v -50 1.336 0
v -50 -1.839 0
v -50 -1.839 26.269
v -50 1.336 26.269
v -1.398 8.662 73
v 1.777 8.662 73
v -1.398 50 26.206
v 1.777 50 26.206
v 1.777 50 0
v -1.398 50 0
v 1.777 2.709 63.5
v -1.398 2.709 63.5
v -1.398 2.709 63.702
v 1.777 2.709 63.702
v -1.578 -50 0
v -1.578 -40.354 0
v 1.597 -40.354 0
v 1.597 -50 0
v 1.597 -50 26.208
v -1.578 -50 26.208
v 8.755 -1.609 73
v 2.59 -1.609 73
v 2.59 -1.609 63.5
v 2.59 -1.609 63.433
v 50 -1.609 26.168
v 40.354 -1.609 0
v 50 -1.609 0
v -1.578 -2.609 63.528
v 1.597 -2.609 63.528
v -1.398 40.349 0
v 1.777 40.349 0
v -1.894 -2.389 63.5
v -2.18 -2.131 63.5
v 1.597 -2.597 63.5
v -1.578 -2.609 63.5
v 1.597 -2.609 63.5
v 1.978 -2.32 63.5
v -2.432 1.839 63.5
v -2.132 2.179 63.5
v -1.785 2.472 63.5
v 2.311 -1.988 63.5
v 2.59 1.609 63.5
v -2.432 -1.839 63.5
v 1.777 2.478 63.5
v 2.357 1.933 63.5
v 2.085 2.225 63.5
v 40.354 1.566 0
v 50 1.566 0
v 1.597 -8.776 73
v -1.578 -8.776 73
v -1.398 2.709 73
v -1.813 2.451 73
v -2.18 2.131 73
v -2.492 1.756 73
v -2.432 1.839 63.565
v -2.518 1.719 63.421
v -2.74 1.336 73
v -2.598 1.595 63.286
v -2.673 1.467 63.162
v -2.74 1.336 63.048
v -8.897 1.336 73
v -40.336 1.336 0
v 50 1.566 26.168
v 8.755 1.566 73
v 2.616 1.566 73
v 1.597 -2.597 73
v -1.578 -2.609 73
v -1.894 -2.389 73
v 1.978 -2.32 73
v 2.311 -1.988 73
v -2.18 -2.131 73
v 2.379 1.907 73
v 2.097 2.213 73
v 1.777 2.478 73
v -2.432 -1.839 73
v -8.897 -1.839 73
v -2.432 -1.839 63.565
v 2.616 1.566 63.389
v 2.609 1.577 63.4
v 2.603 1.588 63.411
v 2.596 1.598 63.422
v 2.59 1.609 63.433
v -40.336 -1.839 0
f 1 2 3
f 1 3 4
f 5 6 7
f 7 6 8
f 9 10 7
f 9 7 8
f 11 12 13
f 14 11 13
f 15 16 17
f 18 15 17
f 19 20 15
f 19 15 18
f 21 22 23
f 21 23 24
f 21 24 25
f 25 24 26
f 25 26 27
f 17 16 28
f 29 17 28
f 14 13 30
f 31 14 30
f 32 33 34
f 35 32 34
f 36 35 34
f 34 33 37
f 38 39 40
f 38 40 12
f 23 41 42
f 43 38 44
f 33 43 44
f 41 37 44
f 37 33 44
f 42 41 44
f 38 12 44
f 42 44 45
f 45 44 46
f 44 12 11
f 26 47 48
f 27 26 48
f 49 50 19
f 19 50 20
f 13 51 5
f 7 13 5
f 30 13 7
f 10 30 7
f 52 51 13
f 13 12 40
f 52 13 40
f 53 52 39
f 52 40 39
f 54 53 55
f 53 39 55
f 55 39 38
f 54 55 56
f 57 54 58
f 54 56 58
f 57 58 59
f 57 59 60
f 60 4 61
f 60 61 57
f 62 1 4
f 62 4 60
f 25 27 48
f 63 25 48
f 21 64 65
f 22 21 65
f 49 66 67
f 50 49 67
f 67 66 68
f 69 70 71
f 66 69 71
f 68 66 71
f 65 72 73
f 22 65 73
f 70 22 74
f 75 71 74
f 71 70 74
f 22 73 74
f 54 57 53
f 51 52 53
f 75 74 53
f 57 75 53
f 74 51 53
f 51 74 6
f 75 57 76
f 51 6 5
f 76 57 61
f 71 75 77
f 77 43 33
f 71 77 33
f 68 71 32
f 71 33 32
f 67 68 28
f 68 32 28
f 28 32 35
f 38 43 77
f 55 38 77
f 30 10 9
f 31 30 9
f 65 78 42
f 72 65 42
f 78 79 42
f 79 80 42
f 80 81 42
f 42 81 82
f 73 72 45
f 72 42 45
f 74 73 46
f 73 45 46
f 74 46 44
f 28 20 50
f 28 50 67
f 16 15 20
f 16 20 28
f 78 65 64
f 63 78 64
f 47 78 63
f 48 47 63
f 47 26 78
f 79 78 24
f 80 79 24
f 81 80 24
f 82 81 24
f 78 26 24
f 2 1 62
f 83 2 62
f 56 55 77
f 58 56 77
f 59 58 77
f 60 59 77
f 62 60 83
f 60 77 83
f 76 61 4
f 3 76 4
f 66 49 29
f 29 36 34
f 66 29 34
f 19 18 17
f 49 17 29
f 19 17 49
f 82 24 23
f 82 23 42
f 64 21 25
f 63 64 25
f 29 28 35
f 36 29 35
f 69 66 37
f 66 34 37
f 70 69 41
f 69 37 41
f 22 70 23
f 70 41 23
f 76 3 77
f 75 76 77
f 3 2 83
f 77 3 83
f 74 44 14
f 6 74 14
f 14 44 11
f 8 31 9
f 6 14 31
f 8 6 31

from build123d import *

# Parameters (mm, degrees)
F0_R         = 3.0488268425
F1_DEPTH     = 110
F2_W         = 3.175
F2_H         = 50
F3_DEPTH     = 80
F5_DEPTH     = 3.175
F6_W         = 50
F6_H         = 3.175
F7_DEPTH     = 80
F9_DEPTH     = 3.2191170087
F10_W        = 3.175
F10_H        = 50
F11_DEPTH    = 80
F13_DEPTH    = 3.5540803911
F14_W        = 50
F14_H        = 3.175
F15_DEPTH    = 80
F17_DEPTH    = 3.175
F18_R        = 5.3096274698
F19_DEPTH    = 5
F21_S5_R     = 3.0488268425
F21_T6_DEPTH = 9
F22_R        = 9.4311090011
F23_DEPTH    = 42
F25_DEPTH    = 3.2191170087
F27_DEPTH    = 3.6788295158
F29_DEPTH    = 3.175
F31_DEPTH    = 3.175
F32_DEPTH    = 63.5


# Not quite as in the source:
# - a fillet or chamfer that OpenCascade refuses, or shapes differently, is made with other operations: its cross-section is extruded or revolved along the edge and cut away or added


with BuildPart() as f1:
    # F0 (on Top) → F1 (new body)
    with BuildSketch(Plane.XY):
        Circle(F0_R)
    extrude(amount=F1_DEPTH)

    # F2 (on Top) → F3 (join)
    with BuildSketch(Plane.XY):
        with Locations((0.0098423844, -25)):
            Rectangle(F2_W, F2_H)
    extrude(amount=F3_DEPTH)

    # F4 (on face) → F5 (cut, through all)
    with BuildSketch(Plane(origin=(-1.5776576156, 0, 0), x_dir=(0, -1, 0), z_dir=(-1, 0, 0))):
        Polygon((50, 80), (2.6088966181, 80), (50, 26.2083634734), align=None)
    extrude(amount=-F5_DEPTH, mode=Mode.SUBTRACT)

    # F6 (on Top) → F7 (join)
    with BuildSketch(Plane.XY):
        with Locations((25, -0.0215585044)):
            Rectangle(F6_W, F6_H)
    extrude(amount=F7_DEPTH)

    # F8 (on face) → F9 (cut, through all)
    with BuildSketch(Plane.XZ.offset(1.6090585044)):
        Polygon((50, 80), (2.5896478226, 80), (50, 26.1678732932), align=None)
    extrude(amount=-F9_DEPTH, mode=Mode.SUBTRACT)

    # F10 (on Top) → F11 (join)
    with BuildSketch(Plane.XY):
        with Locations((0.1890401955, 25)):
            Rectangle(F10_W, F10_H)
    extrude(amount=F11_DEPTH)

    # F12 (on face) → F13 (cut, through all)
    with BuildSketch(Plane.YZ.offset(1.7765401955)):
        Polygon((50, 80), (2.4777510064, 80), (50, 26.2062493712), align=None)
    extrude(amount=-F13_DEPTH, mode=Mode.SUBTRACT)

    # F14 (on Top) → F15 (join)
    with BuildSketch(Plane.XY):
        with Locations((-25, -0.2514147579)):
            Rectangle(F14_W, F14_H)
    extrude(amount=F15_DEPTH)

    # F16 (on face) → F17 (cut, through all)
    with BuildSketch(Plane(origin=(0, 1.3360852421, 0), x_dir=(-1, 0, 0), z_dir=(0, 1, 0))):
        Polygon((50, 80), (2.7404783053, 80), (50, 26.2688063085), align=None)
    extrude(amount=-F17_DEPTH, mode=Mode.SUBTRACT)

    # F18 (on face) → F19 (join)
    with BuildSketch(Plane.XY.offset(110)):
        Circle(F18_R)
    extrude(amount=F19_DEPTH)

    # F21: fillet of radius 5.08 on 1 edges, made by hand


with BuildPart() as f21_tool2:
    # F21_s3 → F21_t4 (revolve)
    with BuildSketch(Plane.XZ):
        with BuildLine():
            ThreePointArc((5.3096274698, 115.08), (3.8217299183, 111.4878975516), (0.2296274698, 110))
            Line((0.2296274698, 110), (5.3096274698, 110))
            Line((5.3096274698, 110), (5.3096274698, 115.08))
        make_face()
    revolve(axis=Axis((0, 0, 110), (0, 0, 1)))

    # F21_s5 → F21_t6 (cut, symmetric)
    with BuildSketch(Plane.XY.offset(112.5)):
        Circle(F21_S5_R)
    extrude(amount=F21_T6_DEPTH, both=True, mode=Mode.SUBTRACT)


with BuildPart() as f1_1:
    add(f1.part)

    # F21_t1: cut F21_tool2
    add(f21_tool2.part, mode=Mode.SUBTRACT)

    # F22 (on face) + F20 (on face) → F23 (cut)
    with BuildSketch(Plane.XY.offset(115)):
        Circle(F22_R)
        with BuildLine():
            add(Edge.make_bspline(
                [(5.3089975095, 0), (5.3089975164, -0.1612273834), (5.3031219673, -0.3224552101), (5.2913709183, -0.483414871), (5.2737606128, -0.6438392355), (5.250323482, -0.803462652), (5.1918928197, -1.1205792461), (5.1568991277, -1.2780732959), (5.1161757966, -1.4342389448), (5.0697872067, -1.5888164279), (5.0178133896, -1.7415503683), (4.9028866804, -2.0428291895), (4.8399334722, -2.1913748989), (4.7715861919, -2.3375759551), (4.6979552247, -2.4811885599), (4.6191655532, -2.621976066), (4.4515479732, -2.8974418959), (4.3627196038, -3.0321209774), (4.2690113246, -3.163516784), (4.1705758713, -3.2914095559), (4.0675790391, -3.4155892111), (3.8528203378, -3.6561214891), (3.741057878, -3.7724747735), (3.6250912427, -3.8847148691), (3.5051104607, -3.9926533309), (3.3813166507, -4.0961135978), (3.1836352831, -4.2494509759), (3.112252337, -4.3025577734), (3.0398087405, -4.3542238063), (2.9663409133, -4.4044227305), (2.8918861372, -4.4531294369), (2.6798136644, -4.5858529875), (2.5400273484, -4.6664055795), (2.3973513324, -4.7418353748), (2.2520206742, -4.812014427), (2.1042777659, -4.876829296), (1.7114232911, -5.0323715135), (1.4627882577, -5.1142142284), (1.2095369224, -5.1812867651), (0.9527644649, -5.2332758894), (0.6935915551, -5.2699775603), (0.2946385826, -5.302637144), (0.1557563369, -5.3096254474), (0.0166889737, -5.3122478349), (-0.1223921213, -5.3104992794), (-0.2613155342, -5.3043837311), (-0.6549222008, -5.27465023), (-0.9088254061, -5.240644445), (-1.1605447695, -5.1919788406), (-1.4090280657, -5.1288359037), (-1.6532455136, -5.0514985311), (-2.0428291895, -4.9028866804), (-2.1913748989, -4.8399334722), (-2.3375759551, -4.7715861919), (-2.4811885599, -4.6979552247), (-2.621976066, -4.6191655532), (-2.9069406851, -4.4457680805), (-3.0506829028, -4.3504435211), (-3.1906552392, -4.2495537919), (-3.326590046, -4.1432865783), (-3.4582324188, -4.0318465385), (-3.7042475112, -3.8065731668), (-3.8191871972, -3.6933574313), (-3.9299611895, -3.5759895387), (-4.0363834457, -3.4546618709), (-4.1382799458, -3.3295777493), (-4.3025292517, -3.1122435833), (-4.3673403783, -3.0218507611), (-4.4298690538, -2.9298431328), (-4.4900653265, -2.8362928914), (-4.547882312, -2.7412742583), (-4.7085243801, -2.4616834099), (-4.8050260286, -2.2734759427), (-4.8924795443, -2.0807665641), (-4.9706274286, -1.8840995099), (-5.0392562783, -1.6840377697), (-5.1431777983, -1.3263374509), (-5.1825166753, -1.1698721609), (-5.2161385309, -1.0120251768), (-5.2439844367, -0.8530575539), (-5.2660114214, -0.6932334439), (-5.2955836982, -0.4000641655), (-5.304971108, -0.2669041947), (-5.3103394555, -0.1334914954), (-5.3116811185, 2.24268e-05), (-5.3089960974, 0.1334858749), (-5.2958672734, 0.3944555075), (-5.285751401, 0.5219785014), (-5.2719511359, 0.6491822874), (-5.2544795994, 0.7759339971), (-5.2333562961, 0.902101548), (-5.1784776927, 1.1802778807), (-5.1429744448, 1.3319423487), (-5.1021441975, 1.4823099163), (-5.0560473437, 1.6311473933), (-5.0047578416, 1.7782255304), (-4.893982686, 2.0632306146), (-4.8348549375, 2.2012974034), (-4.7710584997, 2.3373174414), (-4.7026828716, 2.4710941572), (-4.6298285205, 2.6024363529), (-4.5068458905, 2.8074378588), (-4.4595511931, 2.8827974536), (-4.4107459406, 2.9571984008), (-4.3604545348, 3.030602952), (-4.3087026287, 3.1029741973), (-4.1624425572, 3.2990542656), (-4.06497732, 3.4205578416), (-3.9632659712, 3.5385930737), (-3.8574636047, 3.6529756499), (-3.7477358516, 3.7635306663), (-3.5288873954, 3.9690430432), (-3.4202827483, 4.0645508664), (-3.3085859695, 4.1564837007), (-3.1939446305, 4.2447173665), (-3.0765128434, 4.3291359014), (-2.8225364614, 4.4994151645), (-2.6853493397, 4.5843188029), (-2.5451130327, 4.6641929401), (-2.4020584638, 4.7389023095), (-2.2564243419, 4.8083259132), (-1.9655922898, 4.9341801791), (-1.8205517664, 4.9909766405), (-1.6735574413, 5.0426504529), (-1.5248356135, 5.0891190703), (-1.3746170312, 5.1303133537), (-1.0662467674, 5.2033226624), (-0.9080025448, 5.2347503609), (-0.7486656211, 5.2603988366), (-0.5884996827, 5.280222352), (-0.4277707066, 5.2941912622), (-0.1057232143, 5.3103927821), (0.0555961877, 5.3126254363), (0.216942973, 5.3089765378), (0.3780495323, 5.2994488877), (0.5386489202, 5.2840615287), (0.8583007911, 5.241637974), (1.0173541533, 5.2146016616), (1.1753686742, 5.1817762024), (1.3320816823, 5.1432128436), (1.4872341021, 5.0989786844), (1.7780444639, 5.0044886665), (1.9140592952, 4.9553289334), (2.0484309855, 4.9017372808), (2.1809796225, 4.8437832023), (2.3115293435, 4.7815458821), (2.5831002543, 4.6410173426), (2.7235922798, 4.5617019911), (2.8611458759, 4.4772916377), (2.9955312596, 4.3879234765), (3.1265274005, 4.2937483988), (3.3725308355, 4.1029285715), (3.4880183137, 4.0069016419), (3.6002132702, 3.9069830353), (3.7089527961, 3.8033145651), (3.814082259, 3.6960470264), (3.9755282507, 3.5197361179), (4.0342821646, 3.4529241838), (4.0916866566, 3.3849375827), (4.1477124989, 3.3158104634), (4.2023316243, 3.2455779348), (4.594537319, 2.7197771432), (4.8754447289, 2.2216413722), (5.09088272, 1.6895647911), (5.2363259783, 1.1342583219), (5.3089977324, 0.5670131937), (5.3089975095, 0)],
                knots=[0, 0, 0, 0, 0, 0, 0, 0.0290003201, 0.0290003201, 0.0290003201, 0.0290003201, 0.0290003201, 0.0580006403, 0.0580006403, 0.0580006403, 0.0580006403, 0.0580006403, 0.0870009604, 0.0870009604, 0.0870009604, 0.0870009604, 0.0870009604, 0.1160012805, 0.1160012805, 0.1160012805, 0.1160012805, 0.1160012805, 0.1450016007, 0.1450016007, 0.1450016007, 0.1450016007, 0.1450016007, 0.1610017773, 0.1610017773, 0.1610017773, 0.1610017773, 0.1610017773, 0.1900020974, 0.1900020974, 0.1900020974, 0.1900020974, 0.1900020974, 0.2370026164, 0.2370026164, 0.2370026164, 0.2370026164, 0.2370026164, 0.2620028924, 0.2620028924, 0.2620028924, 0.2620028924, 0.2620028924, 0.3080034003, 0.3080034003, 0.3080034003, 0.3080034003, 0.3080034003, 0.3370037204, 0.3370037204, 0.3370037204, 0.3370037204, 0.3370037204, 0.3680040627, 0.3680040627, 0.3680040627, 0.3680040627, 0.3680040627, 0.3970043828, 0.3970043828, 0.3970043828, 0.3970043828, 0.3970043828, 0.4170046036, 0.4170046036, 0.4170046036, 0.4170046036, 0.4170046036, 0.4550050231, 0.4550050231, 0.4550050231, 0.4550050231, 0.4550050231, 0.4840053432, 0.4840053432, 0.4840053432, 0.4840053432, 0.4840053432, 0.5080056082, 0.5080056082, 0.5080056082, 0.5080056082, 0.5080056082, 0.5310058621, 0.5310058621, 0.5310058621, 0.5310058621, 0.5310058621, 0.5590061711, 0.5590061711, 0.5590061711, 0.5590061711, 0.5590061711, 0.5860064692, 0.5860064692, 0.5860064692, 0.5860064692, 0.5860064692, 0.6020066458, 0.6020066458, 0.6020066458, 0.6020066458, 0.6020066458, 0.6300069549, 0.6300069549, 0.6300069549, 0.6300069549, 0.6300069549, 0.6560072419, 0.6560072419, 0.6560072419, 0.6560072419, 0.6560072419, 0.6850075621, 0.6850075621, 0.6850075621, 0.6850075621, 0.6850075621, 0.7130078712, 0.7130078712, 0.7130078712, 0.7130078712, 0.7130078712, 0.7420081913, 0.7420081913, 0.7420081913, 0.7420081913, 0.7420081913, 0.7710085114, 0.7710085114, 0.7710085114, 0.7710085114, 0.7710085114, 0.8000088316, 0.8000088316, 0.8000088316, 0.8000088316, 0.8000088316, 0.8260091186, 0.8260091186, 0.8260091186, 0.8260091186, 0.8260091186, 0.8550094387, 0.8550094387, 0.8550094387, 0.8550094387, 0.8550094387, 0.8820097368, 0.8820097368, 0.8820097368, 0.8820097368, 0.8820097368, 0.8980099134, 0.8980099134, 0.8980099134, 0.8980099134, 0.8980099134, 1, 1, 1, 1, 1, 1, 1], degree=6))
        make_face(mode=Mode.SUBTRACT)
    with BuildSketch(Plane.XY.offset(115)):
        with BuildLine():
            add(Edge.make_bspline(
                [(5.3089975095, 0), (5.3089975164, -0.1612273834), (5.3031219673, -0.3224552101), (5.2913709183, -0.483414871), (5.2737606128, -0.6438392355), (5.250323482, -0.803462652), (5.1918928197, -1.1205792461), (5.1568991277, -1.2780732959), (5.1161757966, -1.4342389448), (5.0697872067, -1.5888164279), (5.0178133896, -1.7415503683), (4.9028866804, -2.0428291895), (4.8399334722, -2.1913748989), (4.7715861919, -2.3375759551), (4.6979552247, -2.4811885599), (4.6191655532, -2.621976066), (4.4515479732, -2.8974418959), (4.3627196038, -3.0321209774), (4.2690113246, -3.163516784), (4.1705758713, -3.2914095559), (4.0675790391, -3.4155892111), (3.8528203378, -3.6561214891), (3.741057878, -3.7724747735), (3.6250912427, -3.8847148691), (3.5051104607, -3.9926533309), (3.3813166507, -4.0961135978), (3.1836352831, -4.2494509759), (3.112252337, -4.3025577734), (3.0398087405, -4.3542238063), (2.9663409133, -4.4044227305), (2.8918861372, -4.4531294369), (2.6798136644, -4.5858529875), (2.5400273484, -4.6664055795), (2.3973513324, -4.7418353748), (2.2520206742, -4.812014427), (2.1042777659, -4.876829296), (1.7114232911, -5.0323715135), (1.4627882577, -5.1142142284), (1.2095369224, -5.1812867651), (0.9527644649, -5.2332758894), (0.6935915551, -5.2699775603), (0.2946385826, -5.302637144), (0.1557563369, -5.3096254474), (0.0166889737, -5.3122478349), (-0.1223921213, -5.3104992794), (-0.2613155342, -5.3043837311), (-0.6549222008, -5.27465023), (-0.9088254061, -5.240644445), (-1.1605447695, -5.1919788406), (-1.4090280657, -5.1288359037), (-1.6532455136, -5.0514985311), (-2.0428291895, -4.9028866804), (-2.1913748989, -4.8399334722), (-2.3375759551, -4.7715861919), (-2.4811885599, -4.6979552247), (-2.621976066, -4.6191655532), (-2.9069406851, -4.4457680805), (-3.0506829028, -4.3504435211), (-3.1906552392, -4.2495537919), (-3.326590046, -4.1432865783), (-3.4582324188, -4.0318465385), (-3.7042475112, -3.8065731668), (-3.8191871972, -3.6933574313), (-3.9299611895, -3.5759895387), (-4.0363834457, -3.4546618709), (-4.1382799458, -3.3295777493), (-4.3025292517, -3.1122435833), (-4.3673403783, -3.0218507611), (-4.4298690538, -2.9298431328), (-4.4900653265, -2.8362928914), (-4.547882312, -2.7412742583), (-4.7085243801, -2.4616834099), (-4.8050260286, -2.2734759427), (-4.8924795443, -2.0807665641), (-4.9706274286, -1.8840995099), (-5.0392562783, -1.6840377697), (-5.1431777983, -1.3263374509), (-5.1825166753, -1.1698721609), (-5.2161385309, -1.0120251768), (-5.2439844367, -0.8530575539), (-5.2660114214, -0.6932334439), (-5.2955836982, -0.4000641655), (-5.304971108, -0.2669041947), (-5.3103394555, -0.1334914954), (-5.3116811185, 2.24268e-05), (-5.3089960974, 0.1334858749), (-5.2958672734, 0.3944555075), (-5.285751401, 0.5219785014), (-5.2719511359, 0.6491822874), (-5.2544795994, 0.7759339971), (-5.2333562961, 0.902101548), (-5.1784776927, 1.1802778807), (-5.1429744448, 1.3319423487), (-5.1021441975, 1.4823099163), (-5.0560473437, 1.6311473933), (-5.0047578416, 1.7782255304), (-4.893982686, 2.0632306146), (-4.8348549375, 2.2012974034), (-4.7710584997, 2.3373174414), (-4.7026828716, 2.4710941572), (-4.6298285205, 2.6024363529), (-4.5068458905, 2.8074378588), (-4.4595511931, 2.8827974536), (-4.4107459406, 2.9571984008), (-4.3604545348, 3.030602952), (-4.3087026287, 3.1029741973), (-4.1624425572, 3.2990542656), (-4.06497732, 3.4205578416), (-3.9632659712, 3.5385930737), (-3.8574636047, 3.6529756499), (-3.7477358516, 3.7635306663), (-3.5288873954, 3.9690430432), (-3.4202827483, 4.0645508664), (-3.3085859695, 4.1564837007), (-3.1939446305, 4.2447173665), (-3.0765128434, 4.3291359014), (-2.8225364614, 4.4994151645), (-2.6853493397, 4.5843188029), (-2.5451130327, 4.6641929401), (-2.4020584638, 4.7389023095), (-2.2564243419, 4.8083259132), (-1.9655922898, 4.9341801791), (-1.8205517664, 4.9909766405), (-1.6735574413, 5.0426504529), (-1.5248356135, 5.0891190703), (-1.3746170312, 5.1303133537), (-1.0662467674, 5.2033226624), (-0.9080025448, 5.2347503609), (-0.7486656211, 5.2603988366), (-0.5884996827, 5.280222352), (-0.4277707066, 5.2941912622), (-0.1057232143, 5.3103927821), (0.0555961877, 5.3126254363), (0.216942973, 5.3089765378), (0.3780495323, 5.2994488877), (0.5386489202, 5.2840615287), (0.8583007911, 5.241637974), (1.0173541533, 5.2146016616), (1.1753686742, 5.1817762024), (1.3320816823, 5.1432128436), (1.4872341021, 5.0989786844), (1.7780444639, 5.0044886665), (1.9140592952, 4.9553289334), (2.0484309855, 4.9017372808), (2.1809796225, 4.8437832023), (2.3115293435, 4.7815458821), (2.5831002543, 4.6410173426), (2.7235922798, 4.5617019911), (2.8611458759, 4.4772916377), (2.9955312596, 4.3879234765), (3.1265274005, 4.2937483988), (3.3725308355, 4.1029285715), (3.4880183137, 4.0069016419), (3.6002132702, 3.9069830353), (3.7089527961, 3.8033145651), (3.814082259, 3.6960470264), (3.9755282507, 3.5197361179), (4.0342821646, 3.4529241838), (4.0916866566, 3.3849375827), (4.1477124989, 3.3158104634), (4.2023316243, 3.2455779348), (4.594537319, 2.7197771432), (4.8754447289, 2.2216413722), (5.09088272, 1.6895647911), (5.2363259783, 1.1342583219), (5.3089977324, 0.5670131937), (5.3089975095, 0)],
                knots=[0, 0, 0, 0, 0, 0, 0, 0.0290003201, 0.0290003201, 0.0290003201, 0.0290003201, 0.0290003201, 0.0580006403, 0.0580006403, 0.0580006403, 0.0580006403, 0.0580006403, 0.0870009604, 0.0870009604, 0.0870009604, 0.0870009604, 0.0870009604, 0.1160012805, 0.1160012805, 0.1160012805, 0.1160012805, 0.1160012805, 0.1450016007, 0.1450016007, 0.1450016007, 0.1450016007, 0.1450016007, 0.1610017773, 0.1610017773, 0.1610017773, 0.1610017773, 0.1610017773, 0.1900020974, 0.1900020974, 0.1900020974, 0.1900020974, 0.1900020974, 0.2370026164, 0.2370026164, 0.2370026164, 0.2370026164, 0.2370026164, 0.2620028924, 0.2620028924, 0.2620028924, 0.2620028924, 0.2620028924, 0.3080034003, 0.3080034003, 0.3080034003, 0.3080034003, 0.3080034003, 0.3370037204, 0.3370037204, 0.3370037204, 0.3370037204, 0.3370037204, 0.3680040627, 0.3680040627, 0.3680040627, 0.3680040627, 0.3680040627, 0.3970043828, 0.3970043828, 0.3970043828, 0.3970043828, 0.3970043828, 0.4170046036, 0.4170046036, 0.4170046036, 0.4170046036, 0.4170046036, 0.4550050231, 0.4550050231, 0.4550050231, 0.4550050231, 0.4550050231, 0.4840053432, 0.4840053432, 0.4840053432, 0.4840053432, 0.4840053432, 0.5080056082, 0.5080056082, 0.5080056082, 0.5080056082, 0.5080056082, 0.5310058621, 0.5310058621, 0.5310058621, 0.5310058621, 0.5310058621, 0.5590061711, 0.5590061711, 0.5590061711, 0.5590061711, 0.5590061711, 0.5860064692, 0.5860064692, 0.5860064692, 0.5860064692, 0.5860064692, 0.6020066458, 0.6020066458, 0.6020066458, 0.6020066458, 0.6020066458, 0.6300069549, 0.6300069549, 0.6300069549, 0.6300069549, 0.6300069549, 0.6560072419, 0.6560072419, 0.6560072419, 0.6560072419, 0.6560072419, 0.6850075621, 0.6850075621, 0.6850075621, 0.6850075621, 0.6850075621, 0.7130078712, 0.7130078712, 0.7130078712, 0.7130078712, 0.7130078712, 0.7420081913, 0.7420081913, 0.7420081913, 0.7420081913, 0.7420081913, 0.7710085114, 0.7710085114, 0.7710085114, 0.7710085114, 0.7710085114, 0.8000088316, 0.8000088316, 0.8000088316, 0.8000088316, 0.8000088316, 0.8260091186, 0.8260091186, 0.8260091186, 0.8260091186, 0.8260091186, 0.8550094387, 0.8550094387, 0.8550094387, 0.8550094387, 0.8550094387, 0.8820097368, 0.8820097368, 0.8820097368, 0.8820097368, 0.8820097368, 0.8980099134, 0.8980099134, 0.8980099134, 0.8980099134, 0.8980099134, 1, 1, 1, 1, 1, 1, 1], degree=6))
        make_face()
    extrude(amount=-F23_DEPTH, mode=Mode.SUBTRACT)

    # F24 (on face) → F25 (cut, through all)
    with BuildSketch(Plane.XZ.offset(1.6090585044)):
        Polygon((2.5896478226, 51.2986071408), (2.5896478226, 0), (40.3535068035, 0), (2.5896478226, 63.4334683418), align=None)
    extrude(amount=-F25_DEPTH, mode=Mode.SUBTRACT)

    # F26 (on face) → F27 (cut, through all)
    with BuildSketch(Plane.XZ.offset(1.8389147579)):
        Polygon((-2.4318177623, 63.5652467608), (-40.3364486992, 0), (-2.4318177623, 0), align=None)
    extrude(amount=-F27_DEPTH, mode=Mode.SUBTRACT)

    # F28 (on face) → F29 (cut, through all)
    with BuildSketch(Plane(origin=(-1.5776576156, 0, 0), x_dir=(0, -1, 0), z_dir=(-1, 0, 0))):
        Polygon((2.6088966181, 0), (40.3542220592, 0), (2.6088966181, 63.5277628899), align=None)
    extrude(amount=-F29_DEPTH, mode=Mode.SUBTRACT)

    # F30 (on face) → F31 (cut, through all)
    with BuildSketch(Plane(origin=(-1.3984598045, 0, 0), x_dir=(0, -1, 0), z_dir=(-1, 0, 0))):
        Polygon((-2.7091798189, 63.702121377), (-40.3488315642, 0), (-2.7091798189, 0), align=None)
    extrude(amount=-F31_DEPTH, mode=Mode.SUBTRACT)

    # F32 (cut): a face of the model
    f32_faces = [f1_1.faces().sort_by_distance(p)[0] for p in [
        (0.0572129055, 0.0359617419, 0),
    ]]
    extrude(f32_faces, amount=-F32_DEPTH, mode=Mode.SUBTRACT)


solid = f1_1.part
